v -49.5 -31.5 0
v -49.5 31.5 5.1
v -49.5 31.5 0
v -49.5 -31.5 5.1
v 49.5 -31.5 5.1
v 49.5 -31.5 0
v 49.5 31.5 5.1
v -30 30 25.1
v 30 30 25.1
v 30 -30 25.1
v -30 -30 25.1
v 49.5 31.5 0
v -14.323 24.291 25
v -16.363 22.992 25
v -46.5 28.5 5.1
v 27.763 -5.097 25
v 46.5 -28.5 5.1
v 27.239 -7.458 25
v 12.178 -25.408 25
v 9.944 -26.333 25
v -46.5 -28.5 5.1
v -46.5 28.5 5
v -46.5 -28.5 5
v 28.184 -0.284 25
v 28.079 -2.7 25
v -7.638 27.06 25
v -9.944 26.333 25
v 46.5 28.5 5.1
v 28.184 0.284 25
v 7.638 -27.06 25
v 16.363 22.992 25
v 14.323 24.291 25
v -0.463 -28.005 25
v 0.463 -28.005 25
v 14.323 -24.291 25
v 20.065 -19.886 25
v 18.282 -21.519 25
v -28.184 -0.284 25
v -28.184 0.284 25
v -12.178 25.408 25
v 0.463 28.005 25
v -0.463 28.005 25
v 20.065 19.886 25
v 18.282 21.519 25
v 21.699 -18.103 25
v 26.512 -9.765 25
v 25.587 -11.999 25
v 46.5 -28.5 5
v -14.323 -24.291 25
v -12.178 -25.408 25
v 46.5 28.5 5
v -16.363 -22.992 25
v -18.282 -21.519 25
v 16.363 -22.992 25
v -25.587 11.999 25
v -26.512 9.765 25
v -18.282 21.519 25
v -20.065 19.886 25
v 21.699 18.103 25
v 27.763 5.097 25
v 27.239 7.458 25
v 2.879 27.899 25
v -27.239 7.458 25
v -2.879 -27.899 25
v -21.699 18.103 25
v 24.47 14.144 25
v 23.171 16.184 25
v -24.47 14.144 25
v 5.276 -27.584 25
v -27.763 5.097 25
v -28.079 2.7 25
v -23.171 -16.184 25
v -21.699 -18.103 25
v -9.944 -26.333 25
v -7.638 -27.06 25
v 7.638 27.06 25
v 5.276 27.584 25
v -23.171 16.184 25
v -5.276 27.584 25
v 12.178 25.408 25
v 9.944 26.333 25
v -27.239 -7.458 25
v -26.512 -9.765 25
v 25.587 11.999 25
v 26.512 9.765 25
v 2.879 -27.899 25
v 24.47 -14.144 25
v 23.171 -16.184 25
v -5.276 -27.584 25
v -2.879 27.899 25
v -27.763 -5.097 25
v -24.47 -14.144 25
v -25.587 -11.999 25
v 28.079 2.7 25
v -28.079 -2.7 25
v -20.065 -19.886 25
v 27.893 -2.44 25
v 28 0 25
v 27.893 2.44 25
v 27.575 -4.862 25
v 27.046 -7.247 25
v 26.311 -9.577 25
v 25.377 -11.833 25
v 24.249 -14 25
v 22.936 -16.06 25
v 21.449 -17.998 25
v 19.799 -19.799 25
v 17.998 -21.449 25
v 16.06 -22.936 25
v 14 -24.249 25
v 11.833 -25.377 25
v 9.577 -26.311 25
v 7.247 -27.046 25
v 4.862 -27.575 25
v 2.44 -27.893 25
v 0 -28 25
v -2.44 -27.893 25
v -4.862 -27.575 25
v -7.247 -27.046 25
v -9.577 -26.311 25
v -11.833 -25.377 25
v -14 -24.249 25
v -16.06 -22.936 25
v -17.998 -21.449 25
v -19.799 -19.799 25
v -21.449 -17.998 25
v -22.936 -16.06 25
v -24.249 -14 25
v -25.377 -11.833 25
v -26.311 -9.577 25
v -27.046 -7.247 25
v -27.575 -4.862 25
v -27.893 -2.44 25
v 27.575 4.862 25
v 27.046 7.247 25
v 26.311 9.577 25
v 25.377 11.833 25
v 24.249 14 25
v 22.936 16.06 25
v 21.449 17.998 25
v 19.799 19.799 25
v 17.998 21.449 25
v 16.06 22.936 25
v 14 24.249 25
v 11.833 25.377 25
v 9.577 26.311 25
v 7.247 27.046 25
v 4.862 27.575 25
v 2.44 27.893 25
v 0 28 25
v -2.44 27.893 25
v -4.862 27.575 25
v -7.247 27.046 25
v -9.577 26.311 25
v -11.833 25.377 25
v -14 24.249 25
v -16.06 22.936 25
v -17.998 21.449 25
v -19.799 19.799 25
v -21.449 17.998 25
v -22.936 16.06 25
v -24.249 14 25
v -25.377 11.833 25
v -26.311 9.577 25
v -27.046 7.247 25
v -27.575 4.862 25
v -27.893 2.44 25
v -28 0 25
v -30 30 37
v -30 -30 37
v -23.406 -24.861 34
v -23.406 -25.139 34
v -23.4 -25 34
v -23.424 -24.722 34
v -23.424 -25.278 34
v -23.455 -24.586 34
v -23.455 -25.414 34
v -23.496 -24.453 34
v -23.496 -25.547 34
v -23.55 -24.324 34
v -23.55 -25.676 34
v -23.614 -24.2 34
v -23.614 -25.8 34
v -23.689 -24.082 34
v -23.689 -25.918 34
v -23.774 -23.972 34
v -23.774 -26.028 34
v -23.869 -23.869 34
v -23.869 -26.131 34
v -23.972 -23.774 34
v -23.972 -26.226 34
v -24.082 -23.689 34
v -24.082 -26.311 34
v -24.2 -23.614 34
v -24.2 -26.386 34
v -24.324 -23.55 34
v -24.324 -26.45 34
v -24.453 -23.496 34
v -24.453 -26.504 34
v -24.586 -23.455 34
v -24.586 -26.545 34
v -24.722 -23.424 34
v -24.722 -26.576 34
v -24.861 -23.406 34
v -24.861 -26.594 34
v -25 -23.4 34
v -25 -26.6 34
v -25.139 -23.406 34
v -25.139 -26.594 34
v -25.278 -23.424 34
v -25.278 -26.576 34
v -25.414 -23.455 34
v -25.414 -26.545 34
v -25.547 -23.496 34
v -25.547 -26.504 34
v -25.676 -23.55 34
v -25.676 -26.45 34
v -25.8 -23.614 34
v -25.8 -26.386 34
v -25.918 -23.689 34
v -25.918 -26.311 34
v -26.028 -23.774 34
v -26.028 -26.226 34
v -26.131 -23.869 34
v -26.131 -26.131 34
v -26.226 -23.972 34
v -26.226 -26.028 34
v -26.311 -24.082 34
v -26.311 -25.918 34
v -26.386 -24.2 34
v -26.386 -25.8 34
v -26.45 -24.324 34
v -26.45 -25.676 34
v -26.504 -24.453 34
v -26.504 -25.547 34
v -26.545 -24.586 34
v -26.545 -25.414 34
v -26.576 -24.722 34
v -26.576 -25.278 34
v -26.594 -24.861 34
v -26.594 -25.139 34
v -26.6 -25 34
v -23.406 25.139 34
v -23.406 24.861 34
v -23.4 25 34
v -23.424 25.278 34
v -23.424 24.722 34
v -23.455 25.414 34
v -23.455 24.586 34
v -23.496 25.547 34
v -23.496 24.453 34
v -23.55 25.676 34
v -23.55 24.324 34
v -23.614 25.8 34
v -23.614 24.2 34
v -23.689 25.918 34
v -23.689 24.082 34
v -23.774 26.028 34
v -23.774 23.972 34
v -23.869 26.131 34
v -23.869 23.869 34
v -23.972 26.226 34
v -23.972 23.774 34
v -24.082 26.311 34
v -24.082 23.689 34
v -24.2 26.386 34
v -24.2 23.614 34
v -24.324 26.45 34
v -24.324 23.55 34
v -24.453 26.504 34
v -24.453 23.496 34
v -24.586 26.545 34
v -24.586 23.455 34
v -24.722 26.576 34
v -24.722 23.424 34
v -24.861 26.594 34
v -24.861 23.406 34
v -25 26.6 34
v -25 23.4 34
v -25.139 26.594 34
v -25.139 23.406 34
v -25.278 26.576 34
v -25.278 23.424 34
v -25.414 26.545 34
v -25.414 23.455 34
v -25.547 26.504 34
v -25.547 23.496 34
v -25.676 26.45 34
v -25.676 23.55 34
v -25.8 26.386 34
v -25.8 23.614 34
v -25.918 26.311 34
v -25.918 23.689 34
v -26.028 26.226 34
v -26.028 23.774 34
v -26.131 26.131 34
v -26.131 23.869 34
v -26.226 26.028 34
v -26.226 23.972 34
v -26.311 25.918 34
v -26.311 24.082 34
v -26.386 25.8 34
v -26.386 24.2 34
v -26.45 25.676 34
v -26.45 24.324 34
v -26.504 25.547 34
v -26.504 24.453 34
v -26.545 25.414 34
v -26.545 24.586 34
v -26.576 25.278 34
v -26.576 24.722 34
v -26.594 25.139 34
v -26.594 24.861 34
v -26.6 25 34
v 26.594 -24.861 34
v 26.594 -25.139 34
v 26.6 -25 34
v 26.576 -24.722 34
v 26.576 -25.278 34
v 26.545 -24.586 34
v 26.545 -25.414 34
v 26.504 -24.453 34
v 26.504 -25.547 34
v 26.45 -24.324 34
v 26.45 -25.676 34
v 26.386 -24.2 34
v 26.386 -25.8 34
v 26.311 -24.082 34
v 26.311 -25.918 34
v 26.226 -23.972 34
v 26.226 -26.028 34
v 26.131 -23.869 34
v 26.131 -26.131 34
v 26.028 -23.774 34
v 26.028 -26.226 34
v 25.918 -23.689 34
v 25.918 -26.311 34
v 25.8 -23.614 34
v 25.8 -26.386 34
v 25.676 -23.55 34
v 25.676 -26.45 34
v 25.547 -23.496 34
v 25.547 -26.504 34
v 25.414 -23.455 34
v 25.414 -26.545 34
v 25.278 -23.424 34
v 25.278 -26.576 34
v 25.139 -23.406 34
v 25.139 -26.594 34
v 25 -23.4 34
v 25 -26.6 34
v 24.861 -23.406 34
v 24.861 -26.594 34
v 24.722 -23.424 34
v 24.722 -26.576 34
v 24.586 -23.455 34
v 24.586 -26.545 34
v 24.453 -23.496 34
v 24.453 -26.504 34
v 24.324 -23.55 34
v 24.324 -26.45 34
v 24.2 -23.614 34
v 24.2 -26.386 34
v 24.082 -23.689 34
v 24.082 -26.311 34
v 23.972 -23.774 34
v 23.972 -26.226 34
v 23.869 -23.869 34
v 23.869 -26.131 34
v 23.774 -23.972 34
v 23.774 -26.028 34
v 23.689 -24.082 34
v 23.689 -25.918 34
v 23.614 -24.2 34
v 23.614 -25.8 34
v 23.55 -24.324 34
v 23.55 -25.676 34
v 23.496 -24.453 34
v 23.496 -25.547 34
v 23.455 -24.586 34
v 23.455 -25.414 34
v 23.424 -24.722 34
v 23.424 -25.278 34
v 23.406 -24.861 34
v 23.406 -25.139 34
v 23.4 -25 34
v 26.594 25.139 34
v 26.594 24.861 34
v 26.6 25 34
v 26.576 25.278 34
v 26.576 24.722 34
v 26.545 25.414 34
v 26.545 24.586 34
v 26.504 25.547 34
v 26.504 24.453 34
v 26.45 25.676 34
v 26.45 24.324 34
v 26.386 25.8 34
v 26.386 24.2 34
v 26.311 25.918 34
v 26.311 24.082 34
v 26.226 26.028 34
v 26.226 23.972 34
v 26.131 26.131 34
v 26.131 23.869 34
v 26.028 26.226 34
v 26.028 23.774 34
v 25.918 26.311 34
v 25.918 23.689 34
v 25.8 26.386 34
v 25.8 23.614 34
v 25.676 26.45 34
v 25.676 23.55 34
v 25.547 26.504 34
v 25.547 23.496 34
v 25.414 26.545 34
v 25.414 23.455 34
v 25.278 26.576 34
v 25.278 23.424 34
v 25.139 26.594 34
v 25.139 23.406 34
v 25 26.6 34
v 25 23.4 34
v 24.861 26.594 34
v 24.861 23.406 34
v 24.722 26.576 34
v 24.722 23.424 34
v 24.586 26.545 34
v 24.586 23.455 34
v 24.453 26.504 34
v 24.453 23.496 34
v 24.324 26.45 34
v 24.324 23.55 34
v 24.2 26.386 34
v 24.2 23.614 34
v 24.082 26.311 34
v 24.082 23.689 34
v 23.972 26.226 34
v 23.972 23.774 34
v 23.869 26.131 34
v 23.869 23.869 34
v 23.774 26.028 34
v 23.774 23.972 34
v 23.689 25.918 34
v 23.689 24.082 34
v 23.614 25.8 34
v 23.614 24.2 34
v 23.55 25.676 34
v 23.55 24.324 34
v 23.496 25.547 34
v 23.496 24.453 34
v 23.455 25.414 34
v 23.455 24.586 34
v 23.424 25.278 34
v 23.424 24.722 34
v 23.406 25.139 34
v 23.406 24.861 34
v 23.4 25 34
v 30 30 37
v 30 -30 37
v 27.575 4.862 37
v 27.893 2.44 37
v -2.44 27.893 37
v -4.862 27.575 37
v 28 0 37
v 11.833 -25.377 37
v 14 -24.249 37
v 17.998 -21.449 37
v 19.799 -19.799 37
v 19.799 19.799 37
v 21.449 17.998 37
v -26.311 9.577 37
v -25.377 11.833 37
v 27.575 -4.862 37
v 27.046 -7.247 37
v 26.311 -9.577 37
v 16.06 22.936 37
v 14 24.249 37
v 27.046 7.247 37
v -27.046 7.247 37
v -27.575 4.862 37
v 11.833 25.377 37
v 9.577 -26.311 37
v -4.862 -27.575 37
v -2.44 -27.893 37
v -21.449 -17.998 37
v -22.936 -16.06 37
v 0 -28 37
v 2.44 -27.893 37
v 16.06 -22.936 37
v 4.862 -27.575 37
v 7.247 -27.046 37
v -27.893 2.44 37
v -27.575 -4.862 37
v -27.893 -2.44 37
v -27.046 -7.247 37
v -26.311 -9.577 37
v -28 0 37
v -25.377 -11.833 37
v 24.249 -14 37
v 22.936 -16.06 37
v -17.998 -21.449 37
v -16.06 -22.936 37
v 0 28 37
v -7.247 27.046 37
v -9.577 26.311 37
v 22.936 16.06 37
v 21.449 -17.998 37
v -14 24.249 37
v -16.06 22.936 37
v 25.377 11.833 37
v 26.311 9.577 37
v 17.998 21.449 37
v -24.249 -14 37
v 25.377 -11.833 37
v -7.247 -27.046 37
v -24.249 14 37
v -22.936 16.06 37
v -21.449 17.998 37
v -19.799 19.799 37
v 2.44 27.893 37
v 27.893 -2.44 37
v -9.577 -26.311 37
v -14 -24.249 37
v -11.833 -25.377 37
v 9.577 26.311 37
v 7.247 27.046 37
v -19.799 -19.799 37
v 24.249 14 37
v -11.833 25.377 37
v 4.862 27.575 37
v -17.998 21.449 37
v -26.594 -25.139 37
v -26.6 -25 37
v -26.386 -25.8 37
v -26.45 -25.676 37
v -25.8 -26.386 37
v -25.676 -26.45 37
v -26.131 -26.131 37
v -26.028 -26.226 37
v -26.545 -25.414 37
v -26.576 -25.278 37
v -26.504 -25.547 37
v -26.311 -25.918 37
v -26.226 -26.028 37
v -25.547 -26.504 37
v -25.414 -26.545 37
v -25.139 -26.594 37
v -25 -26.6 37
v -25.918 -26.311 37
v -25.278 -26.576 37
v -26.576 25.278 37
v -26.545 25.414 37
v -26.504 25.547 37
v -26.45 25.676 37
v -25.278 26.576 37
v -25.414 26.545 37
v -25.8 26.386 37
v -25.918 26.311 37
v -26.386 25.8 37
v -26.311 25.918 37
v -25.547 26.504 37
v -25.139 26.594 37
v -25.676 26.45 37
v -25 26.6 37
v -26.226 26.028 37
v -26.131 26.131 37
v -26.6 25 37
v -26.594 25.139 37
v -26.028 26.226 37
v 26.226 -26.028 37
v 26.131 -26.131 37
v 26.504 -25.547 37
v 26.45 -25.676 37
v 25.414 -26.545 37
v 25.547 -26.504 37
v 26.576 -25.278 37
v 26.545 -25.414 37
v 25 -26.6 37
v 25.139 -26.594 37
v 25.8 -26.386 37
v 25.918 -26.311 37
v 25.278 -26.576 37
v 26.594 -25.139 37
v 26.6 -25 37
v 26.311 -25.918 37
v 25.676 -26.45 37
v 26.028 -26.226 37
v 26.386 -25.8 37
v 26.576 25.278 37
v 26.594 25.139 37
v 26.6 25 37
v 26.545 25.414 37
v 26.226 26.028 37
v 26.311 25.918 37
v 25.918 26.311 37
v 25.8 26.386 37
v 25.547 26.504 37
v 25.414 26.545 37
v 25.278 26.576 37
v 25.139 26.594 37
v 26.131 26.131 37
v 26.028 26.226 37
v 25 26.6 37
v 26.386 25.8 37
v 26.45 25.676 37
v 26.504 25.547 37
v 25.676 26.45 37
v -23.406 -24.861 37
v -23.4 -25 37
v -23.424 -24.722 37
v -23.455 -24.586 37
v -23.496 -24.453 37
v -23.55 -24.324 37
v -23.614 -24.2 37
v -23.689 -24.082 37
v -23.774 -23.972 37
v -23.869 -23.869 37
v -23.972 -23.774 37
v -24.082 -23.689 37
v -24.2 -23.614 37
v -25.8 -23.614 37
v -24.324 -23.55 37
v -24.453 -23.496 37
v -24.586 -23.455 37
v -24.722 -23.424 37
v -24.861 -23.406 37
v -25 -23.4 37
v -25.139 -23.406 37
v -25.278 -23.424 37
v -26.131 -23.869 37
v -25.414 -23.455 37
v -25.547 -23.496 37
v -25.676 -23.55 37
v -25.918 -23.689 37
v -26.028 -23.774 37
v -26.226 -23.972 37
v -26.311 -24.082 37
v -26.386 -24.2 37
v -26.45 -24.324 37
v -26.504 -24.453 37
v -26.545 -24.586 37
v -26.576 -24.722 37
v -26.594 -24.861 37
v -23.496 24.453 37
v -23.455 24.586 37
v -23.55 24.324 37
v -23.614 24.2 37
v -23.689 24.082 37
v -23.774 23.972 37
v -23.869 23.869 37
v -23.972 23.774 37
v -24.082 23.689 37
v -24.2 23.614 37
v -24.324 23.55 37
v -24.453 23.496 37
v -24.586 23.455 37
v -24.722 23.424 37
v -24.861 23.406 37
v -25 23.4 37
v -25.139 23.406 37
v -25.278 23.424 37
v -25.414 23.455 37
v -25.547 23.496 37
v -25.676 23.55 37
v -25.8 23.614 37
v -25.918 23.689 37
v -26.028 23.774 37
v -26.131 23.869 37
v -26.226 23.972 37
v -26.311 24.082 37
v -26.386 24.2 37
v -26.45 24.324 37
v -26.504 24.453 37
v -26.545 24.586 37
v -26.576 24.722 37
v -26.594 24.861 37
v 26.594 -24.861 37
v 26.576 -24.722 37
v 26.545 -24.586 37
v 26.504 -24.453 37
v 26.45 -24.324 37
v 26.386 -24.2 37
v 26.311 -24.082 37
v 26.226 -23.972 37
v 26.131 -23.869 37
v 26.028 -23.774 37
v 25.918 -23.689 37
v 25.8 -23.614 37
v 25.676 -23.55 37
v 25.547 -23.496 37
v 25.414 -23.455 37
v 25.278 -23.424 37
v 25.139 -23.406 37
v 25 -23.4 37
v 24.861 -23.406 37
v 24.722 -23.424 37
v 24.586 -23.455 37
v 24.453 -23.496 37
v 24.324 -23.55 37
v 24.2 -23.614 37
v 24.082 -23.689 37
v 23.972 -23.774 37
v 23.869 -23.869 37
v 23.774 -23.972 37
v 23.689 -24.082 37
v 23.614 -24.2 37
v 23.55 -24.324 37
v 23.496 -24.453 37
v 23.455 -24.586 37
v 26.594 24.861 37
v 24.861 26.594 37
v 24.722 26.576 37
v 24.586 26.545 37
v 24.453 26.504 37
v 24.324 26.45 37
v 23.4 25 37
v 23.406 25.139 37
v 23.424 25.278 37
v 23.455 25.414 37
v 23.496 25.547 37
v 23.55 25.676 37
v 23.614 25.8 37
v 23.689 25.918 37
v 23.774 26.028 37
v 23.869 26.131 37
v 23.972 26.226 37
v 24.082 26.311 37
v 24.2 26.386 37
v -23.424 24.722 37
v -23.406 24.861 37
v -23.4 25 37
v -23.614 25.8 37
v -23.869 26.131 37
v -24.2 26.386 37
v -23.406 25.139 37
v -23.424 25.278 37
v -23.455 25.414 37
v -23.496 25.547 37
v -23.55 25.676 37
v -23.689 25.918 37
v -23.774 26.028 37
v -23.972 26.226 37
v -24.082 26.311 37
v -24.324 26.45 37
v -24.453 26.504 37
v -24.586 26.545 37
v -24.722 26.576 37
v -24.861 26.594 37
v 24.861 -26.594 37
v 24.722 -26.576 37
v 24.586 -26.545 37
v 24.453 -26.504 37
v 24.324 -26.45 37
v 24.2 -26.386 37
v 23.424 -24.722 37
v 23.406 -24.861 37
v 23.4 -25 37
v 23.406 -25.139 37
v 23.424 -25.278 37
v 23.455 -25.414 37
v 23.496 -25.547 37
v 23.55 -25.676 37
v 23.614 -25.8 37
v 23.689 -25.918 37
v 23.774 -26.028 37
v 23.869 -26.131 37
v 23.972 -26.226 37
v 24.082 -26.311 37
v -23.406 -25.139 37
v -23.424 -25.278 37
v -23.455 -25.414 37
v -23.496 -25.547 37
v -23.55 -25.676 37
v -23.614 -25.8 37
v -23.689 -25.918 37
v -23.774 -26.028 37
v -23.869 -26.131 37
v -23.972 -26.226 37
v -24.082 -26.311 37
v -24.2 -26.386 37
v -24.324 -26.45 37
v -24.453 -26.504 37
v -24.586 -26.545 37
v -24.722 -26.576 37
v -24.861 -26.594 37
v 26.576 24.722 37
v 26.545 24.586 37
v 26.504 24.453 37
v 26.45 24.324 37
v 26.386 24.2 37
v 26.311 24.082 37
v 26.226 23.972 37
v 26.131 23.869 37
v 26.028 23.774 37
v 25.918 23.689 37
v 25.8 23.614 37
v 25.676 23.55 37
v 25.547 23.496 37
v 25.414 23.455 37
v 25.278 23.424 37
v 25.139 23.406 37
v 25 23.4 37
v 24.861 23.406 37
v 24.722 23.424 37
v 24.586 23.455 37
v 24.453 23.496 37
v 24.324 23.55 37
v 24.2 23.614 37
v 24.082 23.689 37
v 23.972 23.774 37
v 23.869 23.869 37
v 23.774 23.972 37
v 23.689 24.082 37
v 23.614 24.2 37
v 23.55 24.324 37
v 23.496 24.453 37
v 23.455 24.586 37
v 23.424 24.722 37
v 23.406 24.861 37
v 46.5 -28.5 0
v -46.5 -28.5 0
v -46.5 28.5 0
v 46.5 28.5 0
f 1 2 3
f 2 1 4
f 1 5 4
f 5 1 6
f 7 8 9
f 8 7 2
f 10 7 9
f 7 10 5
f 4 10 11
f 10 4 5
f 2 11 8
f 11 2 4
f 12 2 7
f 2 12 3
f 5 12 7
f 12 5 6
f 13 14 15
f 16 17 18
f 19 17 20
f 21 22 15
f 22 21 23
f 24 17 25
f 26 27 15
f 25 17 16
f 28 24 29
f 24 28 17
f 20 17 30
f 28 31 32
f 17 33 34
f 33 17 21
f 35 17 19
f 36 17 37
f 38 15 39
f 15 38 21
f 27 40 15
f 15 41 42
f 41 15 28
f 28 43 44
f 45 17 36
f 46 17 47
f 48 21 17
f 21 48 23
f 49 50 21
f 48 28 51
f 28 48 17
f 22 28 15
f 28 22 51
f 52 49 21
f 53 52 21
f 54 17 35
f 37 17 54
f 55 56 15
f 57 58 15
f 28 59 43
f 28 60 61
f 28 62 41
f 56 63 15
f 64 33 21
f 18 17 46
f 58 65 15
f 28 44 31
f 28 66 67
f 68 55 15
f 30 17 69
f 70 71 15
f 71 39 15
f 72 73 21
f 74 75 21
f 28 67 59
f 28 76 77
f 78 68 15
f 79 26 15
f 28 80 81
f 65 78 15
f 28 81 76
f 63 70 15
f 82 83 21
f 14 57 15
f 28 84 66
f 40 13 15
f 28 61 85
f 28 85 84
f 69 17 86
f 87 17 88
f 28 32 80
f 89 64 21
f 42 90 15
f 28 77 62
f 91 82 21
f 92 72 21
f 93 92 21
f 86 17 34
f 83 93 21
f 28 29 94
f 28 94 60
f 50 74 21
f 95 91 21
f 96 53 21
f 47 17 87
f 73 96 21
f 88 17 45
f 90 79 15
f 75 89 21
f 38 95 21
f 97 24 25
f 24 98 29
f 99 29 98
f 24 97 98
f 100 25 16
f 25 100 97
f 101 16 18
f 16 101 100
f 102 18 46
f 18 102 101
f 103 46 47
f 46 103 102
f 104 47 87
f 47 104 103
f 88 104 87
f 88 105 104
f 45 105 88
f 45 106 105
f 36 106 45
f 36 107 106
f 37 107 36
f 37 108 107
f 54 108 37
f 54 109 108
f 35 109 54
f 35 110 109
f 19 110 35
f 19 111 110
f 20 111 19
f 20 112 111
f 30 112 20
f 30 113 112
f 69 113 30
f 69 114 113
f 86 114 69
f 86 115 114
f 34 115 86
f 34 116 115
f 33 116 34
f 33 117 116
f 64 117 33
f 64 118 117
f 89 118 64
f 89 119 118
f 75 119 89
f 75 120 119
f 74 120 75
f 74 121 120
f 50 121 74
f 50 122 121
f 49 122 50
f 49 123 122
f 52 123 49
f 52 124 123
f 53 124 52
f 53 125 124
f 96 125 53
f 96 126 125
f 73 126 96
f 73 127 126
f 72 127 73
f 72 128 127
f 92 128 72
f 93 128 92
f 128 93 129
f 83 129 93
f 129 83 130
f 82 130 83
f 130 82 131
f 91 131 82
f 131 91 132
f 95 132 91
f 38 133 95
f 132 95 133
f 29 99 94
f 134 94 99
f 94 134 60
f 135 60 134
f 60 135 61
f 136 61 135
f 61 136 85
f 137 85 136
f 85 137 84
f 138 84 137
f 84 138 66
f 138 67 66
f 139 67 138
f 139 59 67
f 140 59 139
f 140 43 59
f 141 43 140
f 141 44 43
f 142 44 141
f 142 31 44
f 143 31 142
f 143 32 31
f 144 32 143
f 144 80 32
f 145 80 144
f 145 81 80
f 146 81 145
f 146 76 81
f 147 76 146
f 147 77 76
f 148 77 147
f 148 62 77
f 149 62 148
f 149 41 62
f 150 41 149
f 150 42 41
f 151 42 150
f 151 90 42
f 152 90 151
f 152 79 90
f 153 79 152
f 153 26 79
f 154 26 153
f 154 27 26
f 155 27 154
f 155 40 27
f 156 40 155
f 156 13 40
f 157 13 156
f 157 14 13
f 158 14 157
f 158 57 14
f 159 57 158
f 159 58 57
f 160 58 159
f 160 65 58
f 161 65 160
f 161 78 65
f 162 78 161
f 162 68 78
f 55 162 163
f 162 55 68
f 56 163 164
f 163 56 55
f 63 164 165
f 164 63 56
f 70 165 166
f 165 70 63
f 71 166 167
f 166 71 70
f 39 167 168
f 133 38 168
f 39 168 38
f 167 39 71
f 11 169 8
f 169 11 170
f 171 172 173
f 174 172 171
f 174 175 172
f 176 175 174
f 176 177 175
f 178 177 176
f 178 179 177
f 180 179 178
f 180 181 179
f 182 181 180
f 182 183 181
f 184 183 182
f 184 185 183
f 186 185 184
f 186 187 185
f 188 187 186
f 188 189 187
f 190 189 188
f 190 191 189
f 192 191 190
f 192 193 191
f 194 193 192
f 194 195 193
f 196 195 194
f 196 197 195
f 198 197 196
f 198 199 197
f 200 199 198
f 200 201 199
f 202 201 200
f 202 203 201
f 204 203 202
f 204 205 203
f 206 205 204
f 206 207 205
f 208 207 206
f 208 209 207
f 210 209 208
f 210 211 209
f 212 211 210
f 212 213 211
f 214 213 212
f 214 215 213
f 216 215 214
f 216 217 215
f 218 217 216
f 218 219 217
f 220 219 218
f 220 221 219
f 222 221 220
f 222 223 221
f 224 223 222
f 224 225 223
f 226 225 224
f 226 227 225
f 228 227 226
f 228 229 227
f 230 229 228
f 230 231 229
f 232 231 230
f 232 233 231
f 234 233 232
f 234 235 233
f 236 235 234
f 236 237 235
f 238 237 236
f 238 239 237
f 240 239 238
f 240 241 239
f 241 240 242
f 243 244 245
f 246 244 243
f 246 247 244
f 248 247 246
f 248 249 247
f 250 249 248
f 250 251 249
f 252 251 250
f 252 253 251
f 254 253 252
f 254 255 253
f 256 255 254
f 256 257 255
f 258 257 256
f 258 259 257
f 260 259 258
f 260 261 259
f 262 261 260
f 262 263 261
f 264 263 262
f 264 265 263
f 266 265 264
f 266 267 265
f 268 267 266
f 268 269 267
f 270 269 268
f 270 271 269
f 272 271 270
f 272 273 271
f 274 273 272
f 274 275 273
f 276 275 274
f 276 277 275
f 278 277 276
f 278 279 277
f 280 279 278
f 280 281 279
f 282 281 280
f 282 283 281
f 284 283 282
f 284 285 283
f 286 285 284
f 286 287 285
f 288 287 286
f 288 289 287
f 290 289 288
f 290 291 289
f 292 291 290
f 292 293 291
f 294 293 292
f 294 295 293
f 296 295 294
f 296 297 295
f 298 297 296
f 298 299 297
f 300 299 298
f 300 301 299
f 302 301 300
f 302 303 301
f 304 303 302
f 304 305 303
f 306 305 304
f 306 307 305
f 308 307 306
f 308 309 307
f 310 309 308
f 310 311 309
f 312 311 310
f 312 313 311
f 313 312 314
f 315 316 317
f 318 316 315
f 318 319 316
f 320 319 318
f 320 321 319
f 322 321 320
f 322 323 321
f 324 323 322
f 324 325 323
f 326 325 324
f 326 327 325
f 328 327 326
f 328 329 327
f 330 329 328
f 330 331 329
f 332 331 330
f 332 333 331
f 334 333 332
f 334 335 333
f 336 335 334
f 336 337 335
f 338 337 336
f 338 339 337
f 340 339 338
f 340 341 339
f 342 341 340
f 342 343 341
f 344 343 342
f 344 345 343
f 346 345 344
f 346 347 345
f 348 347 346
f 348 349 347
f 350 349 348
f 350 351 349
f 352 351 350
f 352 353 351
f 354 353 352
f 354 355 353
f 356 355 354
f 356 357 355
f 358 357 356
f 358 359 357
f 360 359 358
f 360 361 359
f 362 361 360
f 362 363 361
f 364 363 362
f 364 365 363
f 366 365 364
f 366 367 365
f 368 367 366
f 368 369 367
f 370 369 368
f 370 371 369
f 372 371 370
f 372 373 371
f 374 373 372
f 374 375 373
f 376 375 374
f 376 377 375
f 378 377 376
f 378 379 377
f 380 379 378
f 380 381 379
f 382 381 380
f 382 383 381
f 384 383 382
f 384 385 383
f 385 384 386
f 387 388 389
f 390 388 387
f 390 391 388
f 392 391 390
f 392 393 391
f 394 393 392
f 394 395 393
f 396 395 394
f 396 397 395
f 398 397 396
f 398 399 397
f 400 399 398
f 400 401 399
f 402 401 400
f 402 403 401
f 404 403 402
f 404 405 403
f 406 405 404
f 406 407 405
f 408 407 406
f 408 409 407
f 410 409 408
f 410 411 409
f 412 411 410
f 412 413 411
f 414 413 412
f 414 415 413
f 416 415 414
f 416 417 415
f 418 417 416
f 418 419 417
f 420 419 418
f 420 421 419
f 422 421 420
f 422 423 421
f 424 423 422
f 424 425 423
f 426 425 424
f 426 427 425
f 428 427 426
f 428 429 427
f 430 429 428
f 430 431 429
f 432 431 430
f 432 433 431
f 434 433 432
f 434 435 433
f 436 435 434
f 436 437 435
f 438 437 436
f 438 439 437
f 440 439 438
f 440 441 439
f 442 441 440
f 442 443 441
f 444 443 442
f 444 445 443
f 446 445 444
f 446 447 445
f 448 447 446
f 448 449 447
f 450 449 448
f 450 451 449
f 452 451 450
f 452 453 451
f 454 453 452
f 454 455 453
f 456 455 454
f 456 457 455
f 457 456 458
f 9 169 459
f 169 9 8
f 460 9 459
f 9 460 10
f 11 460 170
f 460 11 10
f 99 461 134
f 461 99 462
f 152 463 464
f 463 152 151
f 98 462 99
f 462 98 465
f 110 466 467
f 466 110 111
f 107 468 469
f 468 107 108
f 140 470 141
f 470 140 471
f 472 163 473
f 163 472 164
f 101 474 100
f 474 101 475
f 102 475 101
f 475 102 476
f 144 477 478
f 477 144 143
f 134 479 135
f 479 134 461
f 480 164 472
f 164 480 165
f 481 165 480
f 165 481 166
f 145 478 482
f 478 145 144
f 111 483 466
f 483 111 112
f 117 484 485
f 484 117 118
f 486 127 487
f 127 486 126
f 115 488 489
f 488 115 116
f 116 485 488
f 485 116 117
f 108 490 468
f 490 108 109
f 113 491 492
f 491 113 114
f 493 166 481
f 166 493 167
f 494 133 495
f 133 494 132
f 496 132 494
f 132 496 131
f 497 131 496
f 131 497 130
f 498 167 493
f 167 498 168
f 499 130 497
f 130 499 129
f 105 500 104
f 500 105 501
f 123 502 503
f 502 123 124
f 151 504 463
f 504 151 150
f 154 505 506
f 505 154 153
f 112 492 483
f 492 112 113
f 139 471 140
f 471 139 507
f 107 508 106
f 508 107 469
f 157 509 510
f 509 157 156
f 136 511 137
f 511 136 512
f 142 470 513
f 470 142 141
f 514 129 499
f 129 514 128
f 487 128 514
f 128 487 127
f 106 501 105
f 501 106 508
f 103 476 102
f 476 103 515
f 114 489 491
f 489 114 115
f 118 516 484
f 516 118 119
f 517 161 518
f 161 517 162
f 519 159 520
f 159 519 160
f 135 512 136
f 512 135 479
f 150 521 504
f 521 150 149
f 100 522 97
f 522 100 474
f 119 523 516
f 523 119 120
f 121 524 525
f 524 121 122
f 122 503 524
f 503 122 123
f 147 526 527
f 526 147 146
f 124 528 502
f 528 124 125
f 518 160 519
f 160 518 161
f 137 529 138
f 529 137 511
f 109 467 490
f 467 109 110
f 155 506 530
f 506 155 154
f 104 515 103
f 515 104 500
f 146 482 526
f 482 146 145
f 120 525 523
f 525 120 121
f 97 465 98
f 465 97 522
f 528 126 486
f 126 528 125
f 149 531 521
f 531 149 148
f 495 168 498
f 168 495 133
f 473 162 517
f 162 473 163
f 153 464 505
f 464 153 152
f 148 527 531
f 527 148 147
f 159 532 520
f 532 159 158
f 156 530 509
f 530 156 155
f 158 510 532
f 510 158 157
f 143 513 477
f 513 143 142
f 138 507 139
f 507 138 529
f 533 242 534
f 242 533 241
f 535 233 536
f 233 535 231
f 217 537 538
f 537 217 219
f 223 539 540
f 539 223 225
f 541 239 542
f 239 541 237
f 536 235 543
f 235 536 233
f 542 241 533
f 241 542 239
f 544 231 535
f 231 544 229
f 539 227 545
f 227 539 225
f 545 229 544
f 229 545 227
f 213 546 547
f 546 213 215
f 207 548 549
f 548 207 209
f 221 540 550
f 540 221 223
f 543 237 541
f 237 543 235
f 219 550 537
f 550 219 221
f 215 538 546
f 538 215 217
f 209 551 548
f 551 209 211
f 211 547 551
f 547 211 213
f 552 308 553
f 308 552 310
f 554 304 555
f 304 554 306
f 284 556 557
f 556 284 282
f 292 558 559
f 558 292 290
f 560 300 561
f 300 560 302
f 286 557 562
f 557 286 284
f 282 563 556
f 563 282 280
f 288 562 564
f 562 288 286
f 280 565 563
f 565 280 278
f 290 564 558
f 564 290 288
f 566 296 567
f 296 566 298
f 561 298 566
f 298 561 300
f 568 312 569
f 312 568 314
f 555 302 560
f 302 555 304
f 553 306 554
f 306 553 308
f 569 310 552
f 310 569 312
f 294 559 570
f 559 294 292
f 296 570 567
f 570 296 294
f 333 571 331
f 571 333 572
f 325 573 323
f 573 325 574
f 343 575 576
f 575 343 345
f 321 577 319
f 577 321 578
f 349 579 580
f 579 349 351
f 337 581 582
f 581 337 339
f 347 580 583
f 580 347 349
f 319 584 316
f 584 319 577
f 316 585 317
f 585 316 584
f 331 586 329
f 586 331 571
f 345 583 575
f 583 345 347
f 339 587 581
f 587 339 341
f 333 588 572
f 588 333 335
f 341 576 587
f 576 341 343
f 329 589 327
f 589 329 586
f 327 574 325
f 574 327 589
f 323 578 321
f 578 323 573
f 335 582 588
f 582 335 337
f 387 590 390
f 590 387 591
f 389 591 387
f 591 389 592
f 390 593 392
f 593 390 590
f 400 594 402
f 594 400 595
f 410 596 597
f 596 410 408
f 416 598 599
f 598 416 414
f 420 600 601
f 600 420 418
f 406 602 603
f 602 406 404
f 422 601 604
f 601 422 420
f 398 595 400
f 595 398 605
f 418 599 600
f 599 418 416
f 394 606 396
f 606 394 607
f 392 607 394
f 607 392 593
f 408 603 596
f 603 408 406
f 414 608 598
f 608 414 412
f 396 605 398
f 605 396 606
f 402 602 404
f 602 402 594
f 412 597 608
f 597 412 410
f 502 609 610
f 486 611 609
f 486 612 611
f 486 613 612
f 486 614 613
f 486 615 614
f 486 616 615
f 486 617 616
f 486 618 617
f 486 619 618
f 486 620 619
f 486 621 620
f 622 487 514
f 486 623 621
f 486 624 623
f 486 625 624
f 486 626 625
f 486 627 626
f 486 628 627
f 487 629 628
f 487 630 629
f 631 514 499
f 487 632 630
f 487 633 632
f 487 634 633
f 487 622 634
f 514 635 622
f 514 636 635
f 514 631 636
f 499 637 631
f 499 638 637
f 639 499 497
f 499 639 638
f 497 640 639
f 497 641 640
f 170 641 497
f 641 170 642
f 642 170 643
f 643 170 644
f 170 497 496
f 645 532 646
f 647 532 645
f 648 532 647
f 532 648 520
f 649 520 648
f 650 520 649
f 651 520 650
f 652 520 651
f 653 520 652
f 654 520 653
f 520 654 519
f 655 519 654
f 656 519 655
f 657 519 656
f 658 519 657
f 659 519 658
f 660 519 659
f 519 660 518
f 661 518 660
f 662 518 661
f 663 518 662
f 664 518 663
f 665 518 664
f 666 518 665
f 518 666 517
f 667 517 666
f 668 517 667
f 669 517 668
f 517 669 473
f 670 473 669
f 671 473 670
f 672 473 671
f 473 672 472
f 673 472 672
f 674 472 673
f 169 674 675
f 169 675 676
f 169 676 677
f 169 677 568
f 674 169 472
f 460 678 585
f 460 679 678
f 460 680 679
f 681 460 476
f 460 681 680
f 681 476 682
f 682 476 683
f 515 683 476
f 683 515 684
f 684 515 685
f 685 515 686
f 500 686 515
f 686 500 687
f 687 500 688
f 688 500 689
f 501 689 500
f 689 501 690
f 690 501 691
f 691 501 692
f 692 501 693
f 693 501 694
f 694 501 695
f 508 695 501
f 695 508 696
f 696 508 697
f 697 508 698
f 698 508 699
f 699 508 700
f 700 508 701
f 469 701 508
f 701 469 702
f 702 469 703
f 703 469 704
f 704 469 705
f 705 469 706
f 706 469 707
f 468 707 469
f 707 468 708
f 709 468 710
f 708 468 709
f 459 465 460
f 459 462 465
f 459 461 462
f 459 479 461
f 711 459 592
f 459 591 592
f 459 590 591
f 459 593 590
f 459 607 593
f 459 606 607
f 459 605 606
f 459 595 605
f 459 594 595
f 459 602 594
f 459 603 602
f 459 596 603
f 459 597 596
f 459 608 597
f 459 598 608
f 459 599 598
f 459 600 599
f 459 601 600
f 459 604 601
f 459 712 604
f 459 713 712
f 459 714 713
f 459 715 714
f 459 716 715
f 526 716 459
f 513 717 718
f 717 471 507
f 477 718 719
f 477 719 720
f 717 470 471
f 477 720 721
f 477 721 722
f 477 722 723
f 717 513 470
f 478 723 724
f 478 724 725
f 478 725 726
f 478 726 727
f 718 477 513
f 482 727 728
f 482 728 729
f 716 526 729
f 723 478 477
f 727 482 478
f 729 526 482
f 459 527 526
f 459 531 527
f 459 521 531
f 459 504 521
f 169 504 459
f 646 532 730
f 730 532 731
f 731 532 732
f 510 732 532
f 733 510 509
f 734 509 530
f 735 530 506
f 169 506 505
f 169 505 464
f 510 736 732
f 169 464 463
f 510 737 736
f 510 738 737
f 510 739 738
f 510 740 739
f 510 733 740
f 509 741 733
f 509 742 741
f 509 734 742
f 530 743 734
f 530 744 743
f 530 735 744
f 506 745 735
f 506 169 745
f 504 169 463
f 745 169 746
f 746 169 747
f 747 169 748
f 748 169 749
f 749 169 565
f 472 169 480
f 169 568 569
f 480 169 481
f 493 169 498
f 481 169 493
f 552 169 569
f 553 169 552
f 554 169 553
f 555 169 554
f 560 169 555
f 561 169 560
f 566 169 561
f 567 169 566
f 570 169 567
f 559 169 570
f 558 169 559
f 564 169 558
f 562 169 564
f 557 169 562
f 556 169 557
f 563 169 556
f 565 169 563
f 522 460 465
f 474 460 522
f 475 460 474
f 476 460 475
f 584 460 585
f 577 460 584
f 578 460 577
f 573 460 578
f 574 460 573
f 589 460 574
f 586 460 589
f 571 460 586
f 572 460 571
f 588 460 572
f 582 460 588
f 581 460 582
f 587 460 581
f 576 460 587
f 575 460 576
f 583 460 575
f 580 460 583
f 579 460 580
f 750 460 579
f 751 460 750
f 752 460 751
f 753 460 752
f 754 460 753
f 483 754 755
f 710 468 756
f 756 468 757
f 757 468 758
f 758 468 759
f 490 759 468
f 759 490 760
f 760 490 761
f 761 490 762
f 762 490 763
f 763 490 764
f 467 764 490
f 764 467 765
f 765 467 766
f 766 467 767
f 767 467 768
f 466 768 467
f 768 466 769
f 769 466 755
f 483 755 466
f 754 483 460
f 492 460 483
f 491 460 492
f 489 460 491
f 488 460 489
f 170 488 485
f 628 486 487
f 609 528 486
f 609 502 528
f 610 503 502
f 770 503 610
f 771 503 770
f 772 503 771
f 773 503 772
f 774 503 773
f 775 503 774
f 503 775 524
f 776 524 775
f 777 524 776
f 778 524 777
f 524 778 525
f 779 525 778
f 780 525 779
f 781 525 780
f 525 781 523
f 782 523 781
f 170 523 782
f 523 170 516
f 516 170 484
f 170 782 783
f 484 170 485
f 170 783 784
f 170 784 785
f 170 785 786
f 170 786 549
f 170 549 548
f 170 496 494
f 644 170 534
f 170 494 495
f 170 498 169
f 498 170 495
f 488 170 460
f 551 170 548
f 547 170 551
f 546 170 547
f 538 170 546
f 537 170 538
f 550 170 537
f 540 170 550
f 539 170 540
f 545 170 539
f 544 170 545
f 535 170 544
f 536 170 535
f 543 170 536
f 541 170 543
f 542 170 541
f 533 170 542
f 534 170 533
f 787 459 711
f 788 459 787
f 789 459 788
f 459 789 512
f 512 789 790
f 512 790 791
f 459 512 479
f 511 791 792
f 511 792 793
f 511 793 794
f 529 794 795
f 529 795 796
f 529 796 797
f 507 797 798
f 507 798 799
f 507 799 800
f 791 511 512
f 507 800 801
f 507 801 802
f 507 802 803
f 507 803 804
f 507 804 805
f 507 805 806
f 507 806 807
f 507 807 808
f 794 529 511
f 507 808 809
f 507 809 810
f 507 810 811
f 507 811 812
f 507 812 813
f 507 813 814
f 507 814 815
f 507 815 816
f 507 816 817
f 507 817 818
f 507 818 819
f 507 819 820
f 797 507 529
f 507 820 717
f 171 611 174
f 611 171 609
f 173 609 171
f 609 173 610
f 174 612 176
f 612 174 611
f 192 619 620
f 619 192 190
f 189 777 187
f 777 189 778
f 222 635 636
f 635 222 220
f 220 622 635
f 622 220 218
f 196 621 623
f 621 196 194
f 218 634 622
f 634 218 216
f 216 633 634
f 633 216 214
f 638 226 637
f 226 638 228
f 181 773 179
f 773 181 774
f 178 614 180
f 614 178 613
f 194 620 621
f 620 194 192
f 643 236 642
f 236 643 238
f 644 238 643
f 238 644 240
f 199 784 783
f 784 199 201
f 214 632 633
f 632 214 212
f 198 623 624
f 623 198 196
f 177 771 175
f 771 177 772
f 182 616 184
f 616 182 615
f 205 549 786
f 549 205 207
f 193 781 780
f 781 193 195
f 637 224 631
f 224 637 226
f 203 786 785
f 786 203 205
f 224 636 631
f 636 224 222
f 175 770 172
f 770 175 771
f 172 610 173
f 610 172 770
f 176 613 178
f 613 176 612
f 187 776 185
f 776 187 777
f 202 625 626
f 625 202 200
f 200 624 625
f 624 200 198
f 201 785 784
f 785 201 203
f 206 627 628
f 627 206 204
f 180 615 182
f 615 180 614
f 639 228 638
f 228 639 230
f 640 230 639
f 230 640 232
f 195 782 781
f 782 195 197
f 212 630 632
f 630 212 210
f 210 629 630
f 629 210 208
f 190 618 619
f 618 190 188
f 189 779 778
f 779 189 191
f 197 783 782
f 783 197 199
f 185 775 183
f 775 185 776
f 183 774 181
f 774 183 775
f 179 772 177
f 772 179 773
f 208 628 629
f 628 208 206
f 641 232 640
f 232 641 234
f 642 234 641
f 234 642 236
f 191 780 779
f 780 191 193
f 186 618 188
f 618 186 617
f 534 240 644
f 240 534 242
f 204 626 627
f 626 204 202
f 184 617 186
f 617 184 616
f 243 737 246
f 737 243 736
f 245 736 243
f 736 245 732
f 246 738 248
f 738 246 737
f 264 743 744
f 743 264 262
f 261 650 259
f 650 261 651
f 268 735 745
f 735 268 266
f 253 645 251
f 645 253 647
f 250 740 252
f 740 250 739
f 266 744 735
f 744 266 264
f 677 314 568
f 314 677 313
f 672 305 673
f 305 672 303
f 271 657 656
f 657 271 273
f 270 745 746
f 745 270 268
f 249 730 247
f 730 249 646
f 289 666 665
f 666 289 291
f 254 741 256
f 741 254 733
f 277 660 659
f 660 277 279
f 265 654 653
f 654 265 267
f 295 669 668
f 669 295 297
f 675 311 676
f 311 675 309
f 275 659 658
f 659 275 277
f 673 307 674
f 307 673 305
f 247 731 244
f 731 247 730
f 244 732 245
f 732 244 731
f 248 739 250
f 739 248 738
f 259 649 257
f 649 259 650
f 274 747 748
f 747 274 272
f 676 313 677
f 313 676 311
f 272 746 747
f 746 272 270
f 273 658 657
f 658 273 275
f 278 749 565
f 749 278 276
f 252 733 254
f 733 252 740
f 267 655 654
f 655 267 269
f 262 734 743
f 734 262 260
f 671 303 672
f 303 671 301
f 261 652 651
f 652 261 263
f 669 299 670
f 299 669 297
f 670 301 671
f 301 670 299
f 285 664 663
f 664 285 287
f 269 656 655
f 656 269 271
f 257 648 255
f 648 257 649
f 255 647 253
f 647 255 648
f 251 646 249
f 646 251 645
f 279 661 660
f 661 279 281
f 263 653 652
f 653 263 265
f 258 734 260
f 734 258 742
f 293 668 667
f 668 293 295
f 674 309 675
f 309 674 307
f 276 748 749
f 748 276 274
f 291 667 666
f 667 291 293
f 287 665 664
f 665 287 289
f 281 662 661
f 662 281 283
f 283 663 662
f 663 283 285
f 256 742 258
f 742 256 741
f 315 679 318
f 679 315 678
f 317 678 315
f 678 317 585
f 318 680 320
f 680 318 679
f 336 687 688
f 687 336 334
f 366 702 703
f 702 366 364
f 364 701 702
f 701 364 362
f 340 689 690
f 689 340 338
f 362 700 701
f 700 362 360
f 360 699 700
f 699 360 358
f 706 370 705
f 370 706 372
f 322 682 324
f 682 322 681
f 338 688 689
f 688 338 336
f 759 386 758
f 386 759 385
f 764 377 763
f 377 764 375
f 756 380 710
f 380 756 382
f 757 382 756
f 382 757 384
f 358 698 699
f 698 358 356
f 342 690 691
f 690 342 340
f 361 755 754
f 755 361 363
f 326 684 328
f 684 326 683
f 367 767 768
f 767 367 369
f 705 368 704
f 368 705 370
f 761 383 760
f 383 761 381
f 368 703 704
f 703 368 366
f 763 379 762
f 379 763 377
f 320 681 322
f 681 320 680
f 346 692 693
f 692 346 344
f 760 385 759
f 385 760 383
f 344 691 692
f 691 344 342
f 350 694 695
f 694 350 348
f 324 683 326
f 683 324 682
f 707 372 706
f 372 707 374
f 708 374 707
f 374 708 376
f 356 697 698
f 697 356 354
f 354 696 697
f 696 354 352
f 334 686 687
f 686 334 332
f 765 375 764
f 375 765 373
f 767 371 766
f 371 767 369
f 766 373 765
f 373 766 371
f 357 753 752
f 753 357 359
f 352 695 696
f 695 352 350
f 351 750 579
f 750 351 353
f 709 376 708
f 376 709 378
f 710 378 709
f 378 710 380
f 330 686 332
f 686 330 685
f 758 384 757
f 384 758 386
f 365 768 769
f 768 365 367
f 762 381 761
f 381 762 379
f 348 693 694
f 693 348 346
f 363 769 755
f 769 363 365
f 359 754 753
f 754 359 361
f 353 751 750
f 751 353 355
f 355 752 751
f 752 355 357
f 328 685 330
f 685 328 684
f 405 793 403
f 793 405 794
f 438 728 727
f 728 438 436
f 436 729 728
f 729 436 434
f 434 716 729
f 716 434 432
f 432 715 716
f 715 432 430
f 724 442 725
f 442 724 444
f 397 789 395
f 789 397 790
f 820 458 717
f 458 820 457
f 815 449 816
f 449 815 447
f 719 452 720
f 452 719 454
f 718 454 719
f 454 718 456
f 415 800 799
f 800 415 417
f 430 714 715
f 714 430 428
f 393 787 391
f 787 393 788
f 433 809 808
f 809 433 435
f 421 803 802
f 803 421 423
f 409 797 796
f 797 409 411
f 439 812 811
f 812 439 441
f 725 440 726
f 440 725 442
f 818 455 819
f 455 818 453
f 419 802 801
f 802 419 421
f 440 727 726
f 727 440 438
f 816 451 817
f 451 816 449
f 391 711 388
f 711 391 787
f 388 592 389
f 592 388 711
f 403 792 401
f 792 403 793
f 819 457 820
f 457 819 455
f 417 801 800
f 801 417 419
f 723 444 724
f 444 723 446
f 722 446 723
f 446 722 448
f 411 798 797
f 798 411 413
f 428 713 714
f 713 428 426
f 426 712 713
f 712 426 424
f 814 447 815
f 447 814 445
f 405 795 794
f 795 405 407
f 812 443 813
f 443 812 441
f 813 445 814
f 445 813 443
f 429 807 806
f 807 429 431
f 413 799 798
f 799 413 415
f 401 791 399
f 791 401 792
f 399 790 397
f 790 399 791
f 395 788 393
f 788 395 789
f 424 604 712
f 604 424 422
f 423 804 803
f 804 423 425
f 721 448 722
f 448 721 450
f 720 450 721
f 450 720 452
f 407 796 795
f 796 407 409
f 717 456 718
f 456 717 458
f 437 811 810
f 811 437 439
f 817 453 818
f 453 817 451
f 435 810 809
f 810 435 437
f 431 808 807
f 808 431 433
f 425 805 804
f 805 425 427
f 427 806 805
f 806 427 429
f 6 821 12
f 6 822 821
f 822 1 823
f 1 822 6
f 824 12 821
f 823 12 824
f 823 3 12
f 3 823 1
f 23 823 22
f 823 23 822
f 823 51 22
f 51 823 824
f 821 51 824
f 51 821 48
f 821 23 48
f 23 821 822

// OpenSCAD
// ============================================================================
// magtube_fan_adapter.scad
// AFC0612D 60mm fan -> magnetron open face.
// Inner opening 93 long (X) x 57 tall (Y) that WRAPS the magnetron collar via a
// 5mm skirt, then ducts up to the 60mm fan with a straight mounting collar.
// Z axis = airflow; collar end at Z=0, fan at top.
// ============================================================================
$fn = 72;
part = "all";        // "all" | "fitcheck"

/* opening / collar wrap */
op_w         = 93;   // inner opening LONG (X) - wraps collar
op_h         = 57;   // inner opening TALL (Y) - wraps collar
flange_depth = 5;    // skirt depth that slips over the collar
flange_wall  = 3;    // skirt wall thickness

/* fan AFC0612D */
fan_size=60; fan_hole_sq=50; fan_pilot=3.2; fan_bore=56; boss_d=9; boss_h=6; fan_collar=9;

/* duct */
wall=3; duct_len=20;

sk_w = op_w + 2*flange_wall;   // skirt/duct outer
sk_h = op_h + 2*flange_wall;

// 5mm skirt that wraps the collar (straight walls, open bottom)
module skirt(){
  linear_extrude(flange_depth)
    difference(){ square([sk_w,sk_h],center=true); square([op_w,op_h],center=true); }
}
// duct: op_w x op_h opening -> 60 round fan
module duct(){
  translate([0,0,flange_depth])
  difference(){
    hull(){
      linear_extrude(0.1) square([sk_w,sk_h],center=true);
      translate([0,0,duct_len]) linear_extrude(0.1) square([fan_size,fan_size],center=true);
    }
    hull(){
      translate([0,0,-1]) linear_extrude(1.1) square([op_w,op_h],center=true);
      translate([0,0,duct_len+0.1]) linear_extrude(0.1) circle(d=fan_bore);
    }
  }
}
// straight fan collar + plate (flat, accessible holes)
module fan_mount(){
  z0 = flange_depth + duct_len;
  translate([0,0,z0]) difference(){
    linear_extrude(fan_collar) square([fan_size,fan_size],center=true);
    translate([0,0,-1]) linear_extrude(fan_collar+2) circle(d=fan_bore);
  }
  translate([0,0,z0+fan_collar]) difference(){
    linear_extrude(wall) square([fan_size,fan_size],center=true);
    translate([0,0,-1]) cylinder(d=fan_bore,h=wall+2);
    for(sx=[-1,1],sy=[-1,1]) translate([sx*fan_hole_sq/2,sy*fan_hole_sq/2,-1]) cylinder(d=fan_pilot,h=wall+2);
  }
  translate([0,0,z0]) for(sx=[-1,1],sy=[-1,1])
    translate([sx*fan_hole_sq/2,sy*fan_hole_sq/2,fan_collar-boss_h]) difference(){
      cylinder(d=boss_d,h=boss_h+wall);
      translate([0,0,-1]) cylinder(d=fan_pilot,h=boss_h+wall+2);
    }
}
module adapter(){ skirt(); duct(); fan_mount(); }
module collar_ghost(){ color([.7,.7,.7,.35]) translate([0,0,-30]) linear_extrude(34) square([op_w,op_h],center=true); }

if(part=="all")      adapter();
if(part=="fitcheck"){ adapter(); collar_ghost(); }
